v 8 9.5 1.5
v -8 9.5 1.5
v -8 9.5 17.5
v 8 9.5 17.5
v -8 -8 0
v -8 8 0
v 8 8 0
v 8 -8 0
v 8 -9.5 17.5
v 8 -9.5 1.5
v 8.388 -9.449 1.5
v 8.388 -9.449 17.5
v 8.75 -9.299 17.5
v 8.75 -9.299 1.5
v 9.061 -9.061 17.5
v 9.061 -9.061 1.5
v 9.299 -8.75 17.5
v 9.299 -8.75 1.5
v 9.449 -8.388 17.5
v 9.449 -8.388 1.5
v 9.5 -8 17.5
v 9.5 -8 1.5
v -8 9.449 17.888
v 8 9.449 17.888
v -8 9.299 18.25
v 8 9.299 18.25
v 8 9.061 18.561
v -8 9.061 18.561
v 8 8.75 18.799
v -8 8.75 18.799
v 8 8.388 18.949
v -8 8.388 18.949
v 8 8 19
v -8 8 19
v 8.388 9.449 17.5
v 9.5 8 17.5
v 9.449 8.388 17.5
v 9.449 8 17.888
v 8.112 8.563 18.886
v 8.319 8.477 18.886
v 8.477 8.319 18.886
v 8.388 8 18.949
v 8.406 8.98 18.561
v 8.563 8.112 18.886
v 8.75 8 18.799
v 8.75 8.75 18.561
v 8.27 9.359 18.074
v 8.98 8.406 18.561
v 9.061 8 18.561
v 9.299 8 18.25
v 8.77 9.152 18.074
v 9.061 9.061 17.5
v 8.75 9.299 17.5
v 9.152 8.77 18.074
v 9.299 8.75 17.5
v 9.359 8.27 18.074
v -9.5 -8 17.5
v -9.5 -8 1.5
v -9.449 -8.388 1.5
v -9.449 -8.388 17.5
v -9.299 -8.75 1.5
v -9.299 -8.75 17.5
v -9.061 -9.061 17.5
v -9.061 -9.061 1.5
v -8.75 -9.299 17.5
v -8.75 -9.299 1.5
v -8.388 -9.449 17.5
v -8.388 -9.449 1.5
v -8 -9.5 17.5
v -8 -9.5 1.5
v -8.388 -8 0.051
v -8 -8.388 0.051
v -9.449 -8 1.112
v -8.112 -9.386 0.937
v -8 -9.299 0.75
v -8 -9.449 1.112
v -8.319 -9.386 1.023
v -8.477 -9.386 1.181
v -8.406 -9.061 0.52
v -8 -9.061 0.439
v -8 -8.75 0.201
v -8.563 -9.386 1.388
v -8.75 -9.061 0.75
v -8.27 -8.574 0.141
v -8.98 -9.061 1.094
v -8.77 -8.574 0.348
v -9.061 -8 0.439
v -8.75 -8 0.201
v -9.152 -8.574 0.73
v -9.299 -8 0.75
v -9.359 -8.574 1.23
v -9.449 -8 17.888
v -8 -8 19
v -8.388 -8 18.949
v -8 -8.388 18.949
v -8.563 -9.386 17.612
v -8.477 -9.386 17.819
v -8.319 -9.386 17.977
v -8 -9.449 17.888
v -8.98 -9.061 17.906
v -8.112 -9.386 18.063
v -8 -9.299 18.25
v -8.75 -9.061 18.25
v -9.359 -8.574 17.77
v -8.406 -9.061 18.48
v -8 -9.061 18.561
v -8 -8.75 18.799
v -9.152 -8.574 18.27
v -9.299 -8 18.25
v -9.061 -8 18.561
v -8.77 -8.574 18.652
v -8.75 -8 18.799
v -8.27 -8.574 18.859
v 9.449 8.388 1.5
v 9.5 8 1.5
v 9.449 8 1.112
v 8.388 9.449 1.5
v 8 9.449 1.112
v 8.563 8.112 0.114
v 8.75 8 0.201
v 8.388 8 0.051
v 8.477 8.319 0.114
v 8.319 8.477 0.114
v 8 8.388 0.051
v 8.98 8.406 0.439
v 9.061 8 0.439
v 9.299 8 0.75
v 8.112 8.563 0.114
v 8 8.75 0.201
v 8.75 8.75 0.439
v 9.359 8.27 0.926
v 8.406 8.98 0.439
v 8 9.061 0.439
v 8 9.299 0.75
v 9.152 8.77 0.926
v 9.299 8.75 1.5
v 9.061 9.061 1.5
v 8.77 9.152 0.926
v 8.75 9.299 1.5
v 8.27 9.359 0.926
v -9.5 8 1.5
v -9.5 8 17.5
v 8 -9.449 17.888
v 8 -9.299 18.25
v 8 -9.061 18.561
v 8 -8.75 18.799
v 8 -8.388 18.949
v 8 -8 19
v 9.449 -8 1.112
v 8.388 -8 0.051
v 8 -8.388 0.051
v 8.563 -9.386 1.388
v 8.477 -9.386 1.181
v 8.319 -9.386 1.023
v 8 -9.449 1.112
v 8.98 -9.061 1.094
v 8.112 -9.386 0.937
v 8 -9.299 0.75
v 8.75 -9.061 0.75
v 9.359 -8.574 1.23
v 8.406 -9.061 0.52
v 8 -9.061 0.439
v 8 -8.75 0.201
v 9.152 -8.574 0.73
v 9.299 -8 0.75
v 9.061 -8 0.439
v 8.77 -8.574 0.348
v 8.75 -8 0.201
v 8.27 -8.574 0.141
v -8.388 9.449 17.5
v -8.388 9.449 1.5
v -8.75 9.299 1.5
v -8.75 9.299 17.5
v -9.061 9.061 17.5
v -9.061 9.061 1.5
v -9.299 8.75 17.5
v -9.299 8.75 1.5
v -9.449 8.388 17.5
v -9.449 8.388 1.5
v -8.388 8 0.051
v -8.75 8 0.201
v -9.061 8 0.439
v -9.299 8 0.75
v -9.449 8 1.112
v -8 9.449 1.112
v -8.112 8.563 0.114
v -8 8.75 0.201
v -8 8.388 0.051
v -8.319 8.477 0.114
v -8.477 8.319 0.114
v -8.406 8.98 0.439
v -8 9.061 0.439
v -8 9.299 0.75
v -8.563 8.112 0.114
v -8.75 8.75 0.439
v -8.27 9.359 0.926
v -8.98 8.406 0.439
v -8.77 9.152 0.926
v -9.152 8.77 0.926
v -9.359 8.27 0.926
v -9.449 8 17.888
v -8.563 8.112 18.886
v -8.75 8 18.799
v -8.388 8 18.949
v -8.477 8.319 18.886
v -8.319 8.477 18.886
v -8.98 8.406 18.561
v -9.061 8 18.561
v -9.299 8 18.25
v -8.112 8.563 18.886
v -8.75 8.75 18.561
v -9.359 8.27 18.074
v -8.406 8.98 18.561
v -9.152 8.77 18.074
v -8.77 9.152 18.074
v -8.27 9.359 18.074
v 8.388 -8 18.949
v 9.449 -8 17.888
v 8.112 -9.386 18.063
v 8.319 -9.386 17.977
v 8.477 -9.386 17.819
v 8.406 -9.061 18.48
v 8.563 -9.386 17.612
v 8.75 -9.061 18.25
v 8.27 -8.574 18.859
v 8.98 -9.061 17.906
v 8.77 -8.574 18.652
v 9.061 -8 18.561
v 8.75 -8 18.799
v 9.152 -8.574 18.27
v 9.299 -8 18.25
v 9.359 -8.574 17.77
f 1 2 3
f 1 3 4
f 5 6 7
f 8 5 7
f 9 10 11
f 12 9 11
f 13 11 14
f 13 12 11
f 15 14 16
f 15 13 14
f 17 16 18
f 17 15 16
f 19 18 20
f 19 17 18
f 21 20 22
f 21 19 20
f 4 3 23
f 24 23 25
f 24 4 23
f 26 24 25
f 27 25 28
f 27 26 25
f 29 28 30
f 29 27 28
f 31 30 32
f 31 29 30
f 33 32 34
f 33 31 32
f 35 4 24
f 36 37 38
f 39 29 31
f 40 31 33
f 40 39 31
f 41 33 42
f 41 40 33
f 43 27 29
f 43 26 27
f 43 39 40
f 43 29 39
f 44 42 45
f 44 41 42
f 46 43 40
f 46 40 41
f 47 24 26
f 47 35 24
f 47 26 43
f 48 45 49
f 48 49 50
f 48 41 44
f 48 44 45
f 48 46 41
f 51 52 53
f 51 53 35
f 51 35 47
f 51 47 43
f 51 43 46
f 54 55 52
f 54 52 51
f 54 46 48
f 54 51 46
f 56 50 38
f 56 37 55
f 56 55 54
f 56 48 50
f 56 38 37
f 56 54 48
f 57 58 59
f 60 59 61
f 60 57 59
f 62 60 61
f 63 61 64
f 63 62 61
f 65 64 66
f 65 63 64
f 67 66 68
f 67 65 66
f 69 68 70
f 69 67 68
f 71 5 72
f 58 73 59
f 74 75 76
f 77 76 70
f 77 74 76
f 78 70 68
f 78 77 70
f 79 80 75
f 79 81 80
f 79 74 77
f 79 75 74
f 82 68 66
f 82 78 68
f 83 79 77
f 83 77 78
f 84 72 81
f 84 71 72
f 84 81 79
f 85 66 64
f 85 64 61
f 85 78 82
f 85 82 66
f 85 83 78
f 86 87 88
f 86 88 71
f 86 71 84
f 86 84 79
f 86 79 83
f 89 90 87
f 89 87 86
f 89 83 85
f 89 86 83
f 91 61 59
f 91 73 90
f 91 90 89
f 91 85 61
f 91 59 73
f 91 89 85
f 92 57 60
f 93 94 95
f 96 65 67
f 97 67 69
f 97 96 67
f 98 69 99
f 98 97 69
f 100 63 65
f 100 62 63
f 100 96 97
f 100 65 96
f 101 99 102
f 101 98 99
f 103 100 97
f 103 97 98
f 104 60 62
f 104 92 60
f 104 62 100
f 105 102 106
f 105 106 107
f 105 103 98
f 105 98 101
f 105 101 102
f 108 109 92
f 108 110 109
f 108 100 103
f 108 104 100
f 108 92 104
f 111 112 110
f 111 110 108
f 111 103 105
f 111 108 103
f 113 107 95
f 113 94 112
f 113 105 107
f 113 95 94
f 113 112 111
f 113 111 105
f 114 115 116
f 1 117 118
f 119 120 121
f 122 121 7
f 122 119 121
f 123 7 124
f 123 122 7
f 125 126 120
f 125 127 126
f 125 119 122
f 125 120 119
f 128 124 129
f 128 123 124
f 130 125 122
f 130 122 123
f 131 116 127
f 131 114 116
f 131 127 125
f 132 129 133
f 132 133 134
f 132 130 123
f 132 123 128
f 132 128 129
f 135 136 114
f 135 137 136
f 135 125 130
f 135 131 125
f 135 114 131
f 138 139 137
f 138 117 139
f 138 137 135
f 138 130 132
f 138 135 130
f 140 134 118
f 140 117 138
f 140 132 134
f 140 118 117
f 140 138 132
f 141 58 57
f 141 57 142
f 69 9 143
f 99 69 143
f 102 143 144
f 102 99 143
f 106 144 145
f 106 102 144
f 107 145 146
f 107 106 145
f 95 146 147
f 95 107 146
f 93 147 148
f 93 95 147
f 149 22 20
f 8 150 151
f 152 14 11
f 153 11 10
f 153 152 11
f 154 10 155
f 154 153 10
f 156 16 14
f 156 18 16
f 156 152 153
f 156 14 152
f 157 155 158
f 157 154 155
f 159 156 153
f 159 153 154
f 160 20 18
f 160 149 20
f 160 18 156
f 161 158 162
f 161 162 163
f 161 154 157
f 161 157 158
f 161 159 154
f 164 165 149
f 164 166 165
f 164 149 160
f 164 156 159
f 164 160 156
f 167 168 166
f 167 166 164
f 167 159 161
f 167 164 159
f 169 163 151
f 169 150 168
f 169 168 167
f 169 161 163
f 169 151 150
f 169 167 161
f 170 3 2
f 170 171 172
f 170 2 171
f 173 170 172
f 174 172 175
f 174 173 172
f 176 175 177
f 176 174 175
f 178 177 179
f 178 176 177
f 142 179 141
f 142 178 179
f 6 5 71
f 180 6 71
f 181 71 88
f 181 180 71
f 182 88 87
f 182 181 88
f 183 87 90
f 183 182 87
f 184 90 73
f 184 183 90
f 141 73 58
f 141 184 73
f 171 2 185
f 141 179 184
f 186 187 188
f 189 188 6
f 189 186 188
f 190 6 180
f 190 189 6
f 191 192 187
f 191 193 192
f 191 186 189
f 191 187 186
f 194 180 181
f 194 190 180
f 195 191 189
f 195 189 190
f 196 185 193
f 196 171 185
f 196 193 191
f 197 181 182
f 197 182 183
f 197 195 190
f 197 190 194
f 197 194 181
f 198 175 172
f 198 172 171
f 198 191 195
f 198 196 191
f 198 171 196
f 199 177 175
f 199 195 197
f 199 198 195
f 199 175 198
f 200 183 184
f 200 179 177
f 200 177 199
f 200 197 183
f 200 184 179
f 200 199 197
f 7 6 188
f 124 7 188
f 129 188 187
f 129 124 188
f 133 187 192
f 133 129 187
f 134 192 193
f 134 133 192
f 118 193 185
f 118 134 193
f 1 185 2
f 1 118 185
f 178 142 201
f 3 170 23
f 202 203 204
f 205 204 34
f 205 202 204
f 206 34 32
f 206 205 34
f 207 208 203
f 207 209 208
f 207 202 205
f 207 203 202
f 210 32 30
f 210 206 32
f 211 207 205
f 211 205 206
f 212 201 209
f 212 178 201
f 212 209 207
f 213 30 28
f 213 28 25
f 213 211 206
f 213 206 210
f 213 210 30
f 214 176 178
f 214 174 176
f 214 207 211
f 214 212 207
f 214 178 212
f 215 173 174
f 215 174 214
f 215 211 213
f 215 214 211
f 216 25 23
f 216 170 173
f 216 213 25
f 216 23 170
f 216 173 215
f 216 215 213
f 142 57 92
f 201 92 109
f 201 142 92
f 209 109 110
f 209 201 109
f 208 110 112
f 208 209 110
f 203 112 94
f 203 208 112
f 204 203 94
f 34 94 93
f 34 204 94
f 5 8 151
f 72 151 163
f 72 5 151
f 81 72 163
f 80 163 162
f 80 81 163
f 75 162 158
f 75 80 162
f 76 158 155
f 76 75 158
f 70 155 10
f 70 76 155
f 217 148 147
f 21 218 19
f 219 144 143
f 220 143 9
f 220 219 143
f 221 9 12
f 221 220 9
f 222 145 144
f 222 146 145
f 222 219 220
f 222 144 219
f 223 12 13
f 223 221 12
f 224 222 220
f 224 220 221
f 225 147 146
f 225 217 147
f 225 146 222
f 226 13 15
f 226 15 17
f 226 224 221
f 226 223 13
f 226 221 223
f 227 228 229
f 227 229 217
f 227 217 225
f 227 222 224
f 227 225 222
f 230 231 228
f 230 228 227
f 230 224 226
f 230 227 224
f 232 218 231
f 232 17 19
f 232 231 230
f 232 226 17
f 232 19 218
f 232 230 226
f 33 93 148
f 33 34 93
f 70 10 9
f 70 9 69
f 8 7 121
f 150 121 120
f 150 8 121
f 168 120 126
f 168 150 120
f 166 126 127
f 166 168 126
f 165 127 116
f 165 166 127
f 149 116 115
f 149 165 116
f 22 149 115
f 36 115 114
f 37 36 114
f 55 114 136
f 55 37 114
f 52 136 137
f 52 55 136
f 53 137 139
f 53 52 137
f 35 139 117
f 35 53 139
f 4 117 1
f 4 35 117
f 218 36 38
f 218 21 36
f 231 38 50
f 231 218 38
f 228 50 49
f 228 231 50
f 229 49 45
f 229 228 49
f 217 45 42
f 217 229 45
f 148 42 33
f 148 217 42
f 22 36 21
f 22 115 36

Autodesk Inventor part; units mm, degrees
ref_plane "YZ Plane" through (0, 0, 0) normal (1, 0, 0) x (0, 1, 0)
ref_plane "XZ Plane" through (0, 0, 0) normal (0, 1, 0) x (-1, 0, 0)
ref_plane "XY Plane" through (0, 0, 0) normal (0, 0, 1) x (1, 0, 0)
sketch "Sketch1" plane through (0, 0, 0) normal (0, 0, 1) x (1, 0, 0)
  line L0 (-9.5, 9.5) -> (9.5, 9.5)
  line L1 (9.5, 9.5) -> (9.5, -9.5)
  line L2 (9.5, -9.5) -> (-9.5, -9.5)
  line L3 (-9.5, -9.5) -> (-9.5, 9.5)
  point P0 (0, 0)
  dimension "d0" = 19
  dimension "d1" = 19
  dimension "d2" = 9.5
  dimension "d3" = 9.5
extrude "Extrusion1" add sketch "Sketch1" along normal blind 19
fillet "Fillet1" radius 1.5 12 edges at (9.5, 9.5, 9.5) (9.5, 0, 19) (9.5, 0, 0) (9.5, -9.5, 9.5) (-9.5, 9.5, 9.5) (-9.5, 0, 19) (-9.5, 0, 0) (-9.5, -9.5, 9.5) (0, -9.5, 19) (0, 9.5, 19) (0, 9.5, 0) (0, -9.5, 0)
properties part number "cube"
